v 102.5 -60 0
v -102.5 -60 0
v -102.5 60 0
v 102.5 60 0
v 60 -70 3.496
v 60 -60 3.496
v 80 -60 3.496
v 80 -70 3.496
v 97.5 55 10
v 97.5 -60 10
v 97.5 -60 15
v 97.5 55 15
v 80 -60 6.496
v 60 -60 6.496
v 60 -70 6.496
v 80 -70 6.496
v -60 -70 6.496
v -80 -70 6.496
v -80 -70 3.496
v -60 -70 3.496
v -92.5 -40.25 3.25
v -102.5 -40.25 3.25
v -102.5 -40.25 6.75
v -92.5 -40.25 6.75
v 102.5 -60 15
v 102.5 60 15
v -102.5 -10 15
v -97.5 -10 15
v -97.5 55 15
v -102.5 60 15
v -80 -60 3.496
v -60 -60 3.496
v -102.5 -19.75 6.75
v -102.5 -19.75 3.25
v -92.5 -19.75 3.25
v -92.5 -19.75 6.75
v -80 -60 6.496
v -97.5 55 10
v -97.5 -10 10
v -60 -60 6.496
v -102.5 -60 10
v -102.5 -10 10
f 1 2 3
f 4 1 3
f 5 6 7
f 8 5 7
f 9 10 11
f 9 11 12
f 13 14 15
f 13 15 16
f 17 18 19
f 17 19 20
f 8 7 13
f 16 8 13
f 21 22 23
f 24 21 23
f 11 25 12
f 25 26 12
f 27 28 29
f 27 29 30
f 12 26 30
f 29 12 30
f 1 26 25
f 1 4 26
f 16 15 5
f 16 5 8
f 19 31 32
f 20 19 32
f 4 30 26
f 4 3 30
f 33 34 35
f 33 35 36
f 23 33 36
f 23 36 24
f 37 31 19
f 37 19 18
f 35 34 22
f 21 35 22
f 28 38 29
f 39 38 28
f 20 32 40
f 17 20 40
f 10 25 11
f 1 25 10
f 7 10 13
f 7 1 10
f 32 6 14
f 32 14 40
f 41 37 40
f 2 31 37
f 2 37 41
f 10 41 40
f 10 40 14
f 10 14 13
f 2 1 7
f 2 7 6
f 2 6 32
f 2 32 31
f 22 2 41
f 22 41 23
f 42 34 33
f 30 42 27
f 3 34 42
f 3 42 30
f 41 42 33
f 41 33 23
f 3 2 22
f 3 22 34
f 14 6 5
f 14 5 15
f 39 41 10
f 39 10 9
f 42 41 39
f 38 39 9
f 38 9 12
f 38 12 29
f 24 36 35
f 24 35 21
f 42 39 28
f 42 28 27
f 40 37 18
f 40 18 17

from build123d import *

# Parameters (mm, degrees)
SKETCH1_W           = 120
SKETCH1_H           = 205
BOSS_EXTRUDE1_DEPTH = 10
BOSS_EXTRUDE2_DEPTH = 5
SKETCH3_W           = 20.5
SKETCH3_H           = 3.5
CUT_EXTRUDE1_DEPTH  = 10
SKETCH4_W           = 20
SKETCH4_H           = 3
BOSS_EXTRUDE3_DEPTH = 10


with BuildPart() as part:
    # Sketch1 → Boss-Extrude1 (new body)
    with BuildSketch(Plane(origin=(0, 0, 0), x_dir=(0, 1, 0), z_dir=(0, 0, 1))):
        Rectangle(SKETCH1_W, SKETCH1_H)
    extrude(amount=BOSS_EXTRUDE1_DEPTH)

    # Sketch2 → Boss-Extrude2 (add)
    with BuildSketch(Plane.XY.offset(10)):
        Polygon((102.5, -60), (97.5, -60), (97.5, 55), (-97.5, 55), (-97.5, -10), (-102.5, -10), (-102.5, 60), (102.5, 60), align=None)
    extrude(amount=BOSS_EXTRUDE2_DEPTH)

    # Sketch3 → Cut-Extrude1 (cut)
    with BuildSketch(Plane(origin=(-102.5, 0, 0), x_dir=(0, -1, 0), z_dir=(-1, 0, 0))):
        with Locations((30, 5)):
            Rectangle(SKETCH3_W, SKETCH3_H)
    extrude(amount=-CUT_EXTRUDE1_DEPTH, mode=Mode.SUBTRACT)

    # Sketch4 → Boss-Extrude3 (add)
    with BuildSketch(Plane.XZ.offset(60)):
        with Locations((-70, 4.996334029)):
            Rectangle(SKETCH4_W, SKETCH4_H)
        with Locations((70, 4.996334029)):
            Rectangle(SKETCH4_W, SKETCH4_H)
    extrude(amount=BOSS_EXTRUDE3_DEPTH)


solid = part.part
